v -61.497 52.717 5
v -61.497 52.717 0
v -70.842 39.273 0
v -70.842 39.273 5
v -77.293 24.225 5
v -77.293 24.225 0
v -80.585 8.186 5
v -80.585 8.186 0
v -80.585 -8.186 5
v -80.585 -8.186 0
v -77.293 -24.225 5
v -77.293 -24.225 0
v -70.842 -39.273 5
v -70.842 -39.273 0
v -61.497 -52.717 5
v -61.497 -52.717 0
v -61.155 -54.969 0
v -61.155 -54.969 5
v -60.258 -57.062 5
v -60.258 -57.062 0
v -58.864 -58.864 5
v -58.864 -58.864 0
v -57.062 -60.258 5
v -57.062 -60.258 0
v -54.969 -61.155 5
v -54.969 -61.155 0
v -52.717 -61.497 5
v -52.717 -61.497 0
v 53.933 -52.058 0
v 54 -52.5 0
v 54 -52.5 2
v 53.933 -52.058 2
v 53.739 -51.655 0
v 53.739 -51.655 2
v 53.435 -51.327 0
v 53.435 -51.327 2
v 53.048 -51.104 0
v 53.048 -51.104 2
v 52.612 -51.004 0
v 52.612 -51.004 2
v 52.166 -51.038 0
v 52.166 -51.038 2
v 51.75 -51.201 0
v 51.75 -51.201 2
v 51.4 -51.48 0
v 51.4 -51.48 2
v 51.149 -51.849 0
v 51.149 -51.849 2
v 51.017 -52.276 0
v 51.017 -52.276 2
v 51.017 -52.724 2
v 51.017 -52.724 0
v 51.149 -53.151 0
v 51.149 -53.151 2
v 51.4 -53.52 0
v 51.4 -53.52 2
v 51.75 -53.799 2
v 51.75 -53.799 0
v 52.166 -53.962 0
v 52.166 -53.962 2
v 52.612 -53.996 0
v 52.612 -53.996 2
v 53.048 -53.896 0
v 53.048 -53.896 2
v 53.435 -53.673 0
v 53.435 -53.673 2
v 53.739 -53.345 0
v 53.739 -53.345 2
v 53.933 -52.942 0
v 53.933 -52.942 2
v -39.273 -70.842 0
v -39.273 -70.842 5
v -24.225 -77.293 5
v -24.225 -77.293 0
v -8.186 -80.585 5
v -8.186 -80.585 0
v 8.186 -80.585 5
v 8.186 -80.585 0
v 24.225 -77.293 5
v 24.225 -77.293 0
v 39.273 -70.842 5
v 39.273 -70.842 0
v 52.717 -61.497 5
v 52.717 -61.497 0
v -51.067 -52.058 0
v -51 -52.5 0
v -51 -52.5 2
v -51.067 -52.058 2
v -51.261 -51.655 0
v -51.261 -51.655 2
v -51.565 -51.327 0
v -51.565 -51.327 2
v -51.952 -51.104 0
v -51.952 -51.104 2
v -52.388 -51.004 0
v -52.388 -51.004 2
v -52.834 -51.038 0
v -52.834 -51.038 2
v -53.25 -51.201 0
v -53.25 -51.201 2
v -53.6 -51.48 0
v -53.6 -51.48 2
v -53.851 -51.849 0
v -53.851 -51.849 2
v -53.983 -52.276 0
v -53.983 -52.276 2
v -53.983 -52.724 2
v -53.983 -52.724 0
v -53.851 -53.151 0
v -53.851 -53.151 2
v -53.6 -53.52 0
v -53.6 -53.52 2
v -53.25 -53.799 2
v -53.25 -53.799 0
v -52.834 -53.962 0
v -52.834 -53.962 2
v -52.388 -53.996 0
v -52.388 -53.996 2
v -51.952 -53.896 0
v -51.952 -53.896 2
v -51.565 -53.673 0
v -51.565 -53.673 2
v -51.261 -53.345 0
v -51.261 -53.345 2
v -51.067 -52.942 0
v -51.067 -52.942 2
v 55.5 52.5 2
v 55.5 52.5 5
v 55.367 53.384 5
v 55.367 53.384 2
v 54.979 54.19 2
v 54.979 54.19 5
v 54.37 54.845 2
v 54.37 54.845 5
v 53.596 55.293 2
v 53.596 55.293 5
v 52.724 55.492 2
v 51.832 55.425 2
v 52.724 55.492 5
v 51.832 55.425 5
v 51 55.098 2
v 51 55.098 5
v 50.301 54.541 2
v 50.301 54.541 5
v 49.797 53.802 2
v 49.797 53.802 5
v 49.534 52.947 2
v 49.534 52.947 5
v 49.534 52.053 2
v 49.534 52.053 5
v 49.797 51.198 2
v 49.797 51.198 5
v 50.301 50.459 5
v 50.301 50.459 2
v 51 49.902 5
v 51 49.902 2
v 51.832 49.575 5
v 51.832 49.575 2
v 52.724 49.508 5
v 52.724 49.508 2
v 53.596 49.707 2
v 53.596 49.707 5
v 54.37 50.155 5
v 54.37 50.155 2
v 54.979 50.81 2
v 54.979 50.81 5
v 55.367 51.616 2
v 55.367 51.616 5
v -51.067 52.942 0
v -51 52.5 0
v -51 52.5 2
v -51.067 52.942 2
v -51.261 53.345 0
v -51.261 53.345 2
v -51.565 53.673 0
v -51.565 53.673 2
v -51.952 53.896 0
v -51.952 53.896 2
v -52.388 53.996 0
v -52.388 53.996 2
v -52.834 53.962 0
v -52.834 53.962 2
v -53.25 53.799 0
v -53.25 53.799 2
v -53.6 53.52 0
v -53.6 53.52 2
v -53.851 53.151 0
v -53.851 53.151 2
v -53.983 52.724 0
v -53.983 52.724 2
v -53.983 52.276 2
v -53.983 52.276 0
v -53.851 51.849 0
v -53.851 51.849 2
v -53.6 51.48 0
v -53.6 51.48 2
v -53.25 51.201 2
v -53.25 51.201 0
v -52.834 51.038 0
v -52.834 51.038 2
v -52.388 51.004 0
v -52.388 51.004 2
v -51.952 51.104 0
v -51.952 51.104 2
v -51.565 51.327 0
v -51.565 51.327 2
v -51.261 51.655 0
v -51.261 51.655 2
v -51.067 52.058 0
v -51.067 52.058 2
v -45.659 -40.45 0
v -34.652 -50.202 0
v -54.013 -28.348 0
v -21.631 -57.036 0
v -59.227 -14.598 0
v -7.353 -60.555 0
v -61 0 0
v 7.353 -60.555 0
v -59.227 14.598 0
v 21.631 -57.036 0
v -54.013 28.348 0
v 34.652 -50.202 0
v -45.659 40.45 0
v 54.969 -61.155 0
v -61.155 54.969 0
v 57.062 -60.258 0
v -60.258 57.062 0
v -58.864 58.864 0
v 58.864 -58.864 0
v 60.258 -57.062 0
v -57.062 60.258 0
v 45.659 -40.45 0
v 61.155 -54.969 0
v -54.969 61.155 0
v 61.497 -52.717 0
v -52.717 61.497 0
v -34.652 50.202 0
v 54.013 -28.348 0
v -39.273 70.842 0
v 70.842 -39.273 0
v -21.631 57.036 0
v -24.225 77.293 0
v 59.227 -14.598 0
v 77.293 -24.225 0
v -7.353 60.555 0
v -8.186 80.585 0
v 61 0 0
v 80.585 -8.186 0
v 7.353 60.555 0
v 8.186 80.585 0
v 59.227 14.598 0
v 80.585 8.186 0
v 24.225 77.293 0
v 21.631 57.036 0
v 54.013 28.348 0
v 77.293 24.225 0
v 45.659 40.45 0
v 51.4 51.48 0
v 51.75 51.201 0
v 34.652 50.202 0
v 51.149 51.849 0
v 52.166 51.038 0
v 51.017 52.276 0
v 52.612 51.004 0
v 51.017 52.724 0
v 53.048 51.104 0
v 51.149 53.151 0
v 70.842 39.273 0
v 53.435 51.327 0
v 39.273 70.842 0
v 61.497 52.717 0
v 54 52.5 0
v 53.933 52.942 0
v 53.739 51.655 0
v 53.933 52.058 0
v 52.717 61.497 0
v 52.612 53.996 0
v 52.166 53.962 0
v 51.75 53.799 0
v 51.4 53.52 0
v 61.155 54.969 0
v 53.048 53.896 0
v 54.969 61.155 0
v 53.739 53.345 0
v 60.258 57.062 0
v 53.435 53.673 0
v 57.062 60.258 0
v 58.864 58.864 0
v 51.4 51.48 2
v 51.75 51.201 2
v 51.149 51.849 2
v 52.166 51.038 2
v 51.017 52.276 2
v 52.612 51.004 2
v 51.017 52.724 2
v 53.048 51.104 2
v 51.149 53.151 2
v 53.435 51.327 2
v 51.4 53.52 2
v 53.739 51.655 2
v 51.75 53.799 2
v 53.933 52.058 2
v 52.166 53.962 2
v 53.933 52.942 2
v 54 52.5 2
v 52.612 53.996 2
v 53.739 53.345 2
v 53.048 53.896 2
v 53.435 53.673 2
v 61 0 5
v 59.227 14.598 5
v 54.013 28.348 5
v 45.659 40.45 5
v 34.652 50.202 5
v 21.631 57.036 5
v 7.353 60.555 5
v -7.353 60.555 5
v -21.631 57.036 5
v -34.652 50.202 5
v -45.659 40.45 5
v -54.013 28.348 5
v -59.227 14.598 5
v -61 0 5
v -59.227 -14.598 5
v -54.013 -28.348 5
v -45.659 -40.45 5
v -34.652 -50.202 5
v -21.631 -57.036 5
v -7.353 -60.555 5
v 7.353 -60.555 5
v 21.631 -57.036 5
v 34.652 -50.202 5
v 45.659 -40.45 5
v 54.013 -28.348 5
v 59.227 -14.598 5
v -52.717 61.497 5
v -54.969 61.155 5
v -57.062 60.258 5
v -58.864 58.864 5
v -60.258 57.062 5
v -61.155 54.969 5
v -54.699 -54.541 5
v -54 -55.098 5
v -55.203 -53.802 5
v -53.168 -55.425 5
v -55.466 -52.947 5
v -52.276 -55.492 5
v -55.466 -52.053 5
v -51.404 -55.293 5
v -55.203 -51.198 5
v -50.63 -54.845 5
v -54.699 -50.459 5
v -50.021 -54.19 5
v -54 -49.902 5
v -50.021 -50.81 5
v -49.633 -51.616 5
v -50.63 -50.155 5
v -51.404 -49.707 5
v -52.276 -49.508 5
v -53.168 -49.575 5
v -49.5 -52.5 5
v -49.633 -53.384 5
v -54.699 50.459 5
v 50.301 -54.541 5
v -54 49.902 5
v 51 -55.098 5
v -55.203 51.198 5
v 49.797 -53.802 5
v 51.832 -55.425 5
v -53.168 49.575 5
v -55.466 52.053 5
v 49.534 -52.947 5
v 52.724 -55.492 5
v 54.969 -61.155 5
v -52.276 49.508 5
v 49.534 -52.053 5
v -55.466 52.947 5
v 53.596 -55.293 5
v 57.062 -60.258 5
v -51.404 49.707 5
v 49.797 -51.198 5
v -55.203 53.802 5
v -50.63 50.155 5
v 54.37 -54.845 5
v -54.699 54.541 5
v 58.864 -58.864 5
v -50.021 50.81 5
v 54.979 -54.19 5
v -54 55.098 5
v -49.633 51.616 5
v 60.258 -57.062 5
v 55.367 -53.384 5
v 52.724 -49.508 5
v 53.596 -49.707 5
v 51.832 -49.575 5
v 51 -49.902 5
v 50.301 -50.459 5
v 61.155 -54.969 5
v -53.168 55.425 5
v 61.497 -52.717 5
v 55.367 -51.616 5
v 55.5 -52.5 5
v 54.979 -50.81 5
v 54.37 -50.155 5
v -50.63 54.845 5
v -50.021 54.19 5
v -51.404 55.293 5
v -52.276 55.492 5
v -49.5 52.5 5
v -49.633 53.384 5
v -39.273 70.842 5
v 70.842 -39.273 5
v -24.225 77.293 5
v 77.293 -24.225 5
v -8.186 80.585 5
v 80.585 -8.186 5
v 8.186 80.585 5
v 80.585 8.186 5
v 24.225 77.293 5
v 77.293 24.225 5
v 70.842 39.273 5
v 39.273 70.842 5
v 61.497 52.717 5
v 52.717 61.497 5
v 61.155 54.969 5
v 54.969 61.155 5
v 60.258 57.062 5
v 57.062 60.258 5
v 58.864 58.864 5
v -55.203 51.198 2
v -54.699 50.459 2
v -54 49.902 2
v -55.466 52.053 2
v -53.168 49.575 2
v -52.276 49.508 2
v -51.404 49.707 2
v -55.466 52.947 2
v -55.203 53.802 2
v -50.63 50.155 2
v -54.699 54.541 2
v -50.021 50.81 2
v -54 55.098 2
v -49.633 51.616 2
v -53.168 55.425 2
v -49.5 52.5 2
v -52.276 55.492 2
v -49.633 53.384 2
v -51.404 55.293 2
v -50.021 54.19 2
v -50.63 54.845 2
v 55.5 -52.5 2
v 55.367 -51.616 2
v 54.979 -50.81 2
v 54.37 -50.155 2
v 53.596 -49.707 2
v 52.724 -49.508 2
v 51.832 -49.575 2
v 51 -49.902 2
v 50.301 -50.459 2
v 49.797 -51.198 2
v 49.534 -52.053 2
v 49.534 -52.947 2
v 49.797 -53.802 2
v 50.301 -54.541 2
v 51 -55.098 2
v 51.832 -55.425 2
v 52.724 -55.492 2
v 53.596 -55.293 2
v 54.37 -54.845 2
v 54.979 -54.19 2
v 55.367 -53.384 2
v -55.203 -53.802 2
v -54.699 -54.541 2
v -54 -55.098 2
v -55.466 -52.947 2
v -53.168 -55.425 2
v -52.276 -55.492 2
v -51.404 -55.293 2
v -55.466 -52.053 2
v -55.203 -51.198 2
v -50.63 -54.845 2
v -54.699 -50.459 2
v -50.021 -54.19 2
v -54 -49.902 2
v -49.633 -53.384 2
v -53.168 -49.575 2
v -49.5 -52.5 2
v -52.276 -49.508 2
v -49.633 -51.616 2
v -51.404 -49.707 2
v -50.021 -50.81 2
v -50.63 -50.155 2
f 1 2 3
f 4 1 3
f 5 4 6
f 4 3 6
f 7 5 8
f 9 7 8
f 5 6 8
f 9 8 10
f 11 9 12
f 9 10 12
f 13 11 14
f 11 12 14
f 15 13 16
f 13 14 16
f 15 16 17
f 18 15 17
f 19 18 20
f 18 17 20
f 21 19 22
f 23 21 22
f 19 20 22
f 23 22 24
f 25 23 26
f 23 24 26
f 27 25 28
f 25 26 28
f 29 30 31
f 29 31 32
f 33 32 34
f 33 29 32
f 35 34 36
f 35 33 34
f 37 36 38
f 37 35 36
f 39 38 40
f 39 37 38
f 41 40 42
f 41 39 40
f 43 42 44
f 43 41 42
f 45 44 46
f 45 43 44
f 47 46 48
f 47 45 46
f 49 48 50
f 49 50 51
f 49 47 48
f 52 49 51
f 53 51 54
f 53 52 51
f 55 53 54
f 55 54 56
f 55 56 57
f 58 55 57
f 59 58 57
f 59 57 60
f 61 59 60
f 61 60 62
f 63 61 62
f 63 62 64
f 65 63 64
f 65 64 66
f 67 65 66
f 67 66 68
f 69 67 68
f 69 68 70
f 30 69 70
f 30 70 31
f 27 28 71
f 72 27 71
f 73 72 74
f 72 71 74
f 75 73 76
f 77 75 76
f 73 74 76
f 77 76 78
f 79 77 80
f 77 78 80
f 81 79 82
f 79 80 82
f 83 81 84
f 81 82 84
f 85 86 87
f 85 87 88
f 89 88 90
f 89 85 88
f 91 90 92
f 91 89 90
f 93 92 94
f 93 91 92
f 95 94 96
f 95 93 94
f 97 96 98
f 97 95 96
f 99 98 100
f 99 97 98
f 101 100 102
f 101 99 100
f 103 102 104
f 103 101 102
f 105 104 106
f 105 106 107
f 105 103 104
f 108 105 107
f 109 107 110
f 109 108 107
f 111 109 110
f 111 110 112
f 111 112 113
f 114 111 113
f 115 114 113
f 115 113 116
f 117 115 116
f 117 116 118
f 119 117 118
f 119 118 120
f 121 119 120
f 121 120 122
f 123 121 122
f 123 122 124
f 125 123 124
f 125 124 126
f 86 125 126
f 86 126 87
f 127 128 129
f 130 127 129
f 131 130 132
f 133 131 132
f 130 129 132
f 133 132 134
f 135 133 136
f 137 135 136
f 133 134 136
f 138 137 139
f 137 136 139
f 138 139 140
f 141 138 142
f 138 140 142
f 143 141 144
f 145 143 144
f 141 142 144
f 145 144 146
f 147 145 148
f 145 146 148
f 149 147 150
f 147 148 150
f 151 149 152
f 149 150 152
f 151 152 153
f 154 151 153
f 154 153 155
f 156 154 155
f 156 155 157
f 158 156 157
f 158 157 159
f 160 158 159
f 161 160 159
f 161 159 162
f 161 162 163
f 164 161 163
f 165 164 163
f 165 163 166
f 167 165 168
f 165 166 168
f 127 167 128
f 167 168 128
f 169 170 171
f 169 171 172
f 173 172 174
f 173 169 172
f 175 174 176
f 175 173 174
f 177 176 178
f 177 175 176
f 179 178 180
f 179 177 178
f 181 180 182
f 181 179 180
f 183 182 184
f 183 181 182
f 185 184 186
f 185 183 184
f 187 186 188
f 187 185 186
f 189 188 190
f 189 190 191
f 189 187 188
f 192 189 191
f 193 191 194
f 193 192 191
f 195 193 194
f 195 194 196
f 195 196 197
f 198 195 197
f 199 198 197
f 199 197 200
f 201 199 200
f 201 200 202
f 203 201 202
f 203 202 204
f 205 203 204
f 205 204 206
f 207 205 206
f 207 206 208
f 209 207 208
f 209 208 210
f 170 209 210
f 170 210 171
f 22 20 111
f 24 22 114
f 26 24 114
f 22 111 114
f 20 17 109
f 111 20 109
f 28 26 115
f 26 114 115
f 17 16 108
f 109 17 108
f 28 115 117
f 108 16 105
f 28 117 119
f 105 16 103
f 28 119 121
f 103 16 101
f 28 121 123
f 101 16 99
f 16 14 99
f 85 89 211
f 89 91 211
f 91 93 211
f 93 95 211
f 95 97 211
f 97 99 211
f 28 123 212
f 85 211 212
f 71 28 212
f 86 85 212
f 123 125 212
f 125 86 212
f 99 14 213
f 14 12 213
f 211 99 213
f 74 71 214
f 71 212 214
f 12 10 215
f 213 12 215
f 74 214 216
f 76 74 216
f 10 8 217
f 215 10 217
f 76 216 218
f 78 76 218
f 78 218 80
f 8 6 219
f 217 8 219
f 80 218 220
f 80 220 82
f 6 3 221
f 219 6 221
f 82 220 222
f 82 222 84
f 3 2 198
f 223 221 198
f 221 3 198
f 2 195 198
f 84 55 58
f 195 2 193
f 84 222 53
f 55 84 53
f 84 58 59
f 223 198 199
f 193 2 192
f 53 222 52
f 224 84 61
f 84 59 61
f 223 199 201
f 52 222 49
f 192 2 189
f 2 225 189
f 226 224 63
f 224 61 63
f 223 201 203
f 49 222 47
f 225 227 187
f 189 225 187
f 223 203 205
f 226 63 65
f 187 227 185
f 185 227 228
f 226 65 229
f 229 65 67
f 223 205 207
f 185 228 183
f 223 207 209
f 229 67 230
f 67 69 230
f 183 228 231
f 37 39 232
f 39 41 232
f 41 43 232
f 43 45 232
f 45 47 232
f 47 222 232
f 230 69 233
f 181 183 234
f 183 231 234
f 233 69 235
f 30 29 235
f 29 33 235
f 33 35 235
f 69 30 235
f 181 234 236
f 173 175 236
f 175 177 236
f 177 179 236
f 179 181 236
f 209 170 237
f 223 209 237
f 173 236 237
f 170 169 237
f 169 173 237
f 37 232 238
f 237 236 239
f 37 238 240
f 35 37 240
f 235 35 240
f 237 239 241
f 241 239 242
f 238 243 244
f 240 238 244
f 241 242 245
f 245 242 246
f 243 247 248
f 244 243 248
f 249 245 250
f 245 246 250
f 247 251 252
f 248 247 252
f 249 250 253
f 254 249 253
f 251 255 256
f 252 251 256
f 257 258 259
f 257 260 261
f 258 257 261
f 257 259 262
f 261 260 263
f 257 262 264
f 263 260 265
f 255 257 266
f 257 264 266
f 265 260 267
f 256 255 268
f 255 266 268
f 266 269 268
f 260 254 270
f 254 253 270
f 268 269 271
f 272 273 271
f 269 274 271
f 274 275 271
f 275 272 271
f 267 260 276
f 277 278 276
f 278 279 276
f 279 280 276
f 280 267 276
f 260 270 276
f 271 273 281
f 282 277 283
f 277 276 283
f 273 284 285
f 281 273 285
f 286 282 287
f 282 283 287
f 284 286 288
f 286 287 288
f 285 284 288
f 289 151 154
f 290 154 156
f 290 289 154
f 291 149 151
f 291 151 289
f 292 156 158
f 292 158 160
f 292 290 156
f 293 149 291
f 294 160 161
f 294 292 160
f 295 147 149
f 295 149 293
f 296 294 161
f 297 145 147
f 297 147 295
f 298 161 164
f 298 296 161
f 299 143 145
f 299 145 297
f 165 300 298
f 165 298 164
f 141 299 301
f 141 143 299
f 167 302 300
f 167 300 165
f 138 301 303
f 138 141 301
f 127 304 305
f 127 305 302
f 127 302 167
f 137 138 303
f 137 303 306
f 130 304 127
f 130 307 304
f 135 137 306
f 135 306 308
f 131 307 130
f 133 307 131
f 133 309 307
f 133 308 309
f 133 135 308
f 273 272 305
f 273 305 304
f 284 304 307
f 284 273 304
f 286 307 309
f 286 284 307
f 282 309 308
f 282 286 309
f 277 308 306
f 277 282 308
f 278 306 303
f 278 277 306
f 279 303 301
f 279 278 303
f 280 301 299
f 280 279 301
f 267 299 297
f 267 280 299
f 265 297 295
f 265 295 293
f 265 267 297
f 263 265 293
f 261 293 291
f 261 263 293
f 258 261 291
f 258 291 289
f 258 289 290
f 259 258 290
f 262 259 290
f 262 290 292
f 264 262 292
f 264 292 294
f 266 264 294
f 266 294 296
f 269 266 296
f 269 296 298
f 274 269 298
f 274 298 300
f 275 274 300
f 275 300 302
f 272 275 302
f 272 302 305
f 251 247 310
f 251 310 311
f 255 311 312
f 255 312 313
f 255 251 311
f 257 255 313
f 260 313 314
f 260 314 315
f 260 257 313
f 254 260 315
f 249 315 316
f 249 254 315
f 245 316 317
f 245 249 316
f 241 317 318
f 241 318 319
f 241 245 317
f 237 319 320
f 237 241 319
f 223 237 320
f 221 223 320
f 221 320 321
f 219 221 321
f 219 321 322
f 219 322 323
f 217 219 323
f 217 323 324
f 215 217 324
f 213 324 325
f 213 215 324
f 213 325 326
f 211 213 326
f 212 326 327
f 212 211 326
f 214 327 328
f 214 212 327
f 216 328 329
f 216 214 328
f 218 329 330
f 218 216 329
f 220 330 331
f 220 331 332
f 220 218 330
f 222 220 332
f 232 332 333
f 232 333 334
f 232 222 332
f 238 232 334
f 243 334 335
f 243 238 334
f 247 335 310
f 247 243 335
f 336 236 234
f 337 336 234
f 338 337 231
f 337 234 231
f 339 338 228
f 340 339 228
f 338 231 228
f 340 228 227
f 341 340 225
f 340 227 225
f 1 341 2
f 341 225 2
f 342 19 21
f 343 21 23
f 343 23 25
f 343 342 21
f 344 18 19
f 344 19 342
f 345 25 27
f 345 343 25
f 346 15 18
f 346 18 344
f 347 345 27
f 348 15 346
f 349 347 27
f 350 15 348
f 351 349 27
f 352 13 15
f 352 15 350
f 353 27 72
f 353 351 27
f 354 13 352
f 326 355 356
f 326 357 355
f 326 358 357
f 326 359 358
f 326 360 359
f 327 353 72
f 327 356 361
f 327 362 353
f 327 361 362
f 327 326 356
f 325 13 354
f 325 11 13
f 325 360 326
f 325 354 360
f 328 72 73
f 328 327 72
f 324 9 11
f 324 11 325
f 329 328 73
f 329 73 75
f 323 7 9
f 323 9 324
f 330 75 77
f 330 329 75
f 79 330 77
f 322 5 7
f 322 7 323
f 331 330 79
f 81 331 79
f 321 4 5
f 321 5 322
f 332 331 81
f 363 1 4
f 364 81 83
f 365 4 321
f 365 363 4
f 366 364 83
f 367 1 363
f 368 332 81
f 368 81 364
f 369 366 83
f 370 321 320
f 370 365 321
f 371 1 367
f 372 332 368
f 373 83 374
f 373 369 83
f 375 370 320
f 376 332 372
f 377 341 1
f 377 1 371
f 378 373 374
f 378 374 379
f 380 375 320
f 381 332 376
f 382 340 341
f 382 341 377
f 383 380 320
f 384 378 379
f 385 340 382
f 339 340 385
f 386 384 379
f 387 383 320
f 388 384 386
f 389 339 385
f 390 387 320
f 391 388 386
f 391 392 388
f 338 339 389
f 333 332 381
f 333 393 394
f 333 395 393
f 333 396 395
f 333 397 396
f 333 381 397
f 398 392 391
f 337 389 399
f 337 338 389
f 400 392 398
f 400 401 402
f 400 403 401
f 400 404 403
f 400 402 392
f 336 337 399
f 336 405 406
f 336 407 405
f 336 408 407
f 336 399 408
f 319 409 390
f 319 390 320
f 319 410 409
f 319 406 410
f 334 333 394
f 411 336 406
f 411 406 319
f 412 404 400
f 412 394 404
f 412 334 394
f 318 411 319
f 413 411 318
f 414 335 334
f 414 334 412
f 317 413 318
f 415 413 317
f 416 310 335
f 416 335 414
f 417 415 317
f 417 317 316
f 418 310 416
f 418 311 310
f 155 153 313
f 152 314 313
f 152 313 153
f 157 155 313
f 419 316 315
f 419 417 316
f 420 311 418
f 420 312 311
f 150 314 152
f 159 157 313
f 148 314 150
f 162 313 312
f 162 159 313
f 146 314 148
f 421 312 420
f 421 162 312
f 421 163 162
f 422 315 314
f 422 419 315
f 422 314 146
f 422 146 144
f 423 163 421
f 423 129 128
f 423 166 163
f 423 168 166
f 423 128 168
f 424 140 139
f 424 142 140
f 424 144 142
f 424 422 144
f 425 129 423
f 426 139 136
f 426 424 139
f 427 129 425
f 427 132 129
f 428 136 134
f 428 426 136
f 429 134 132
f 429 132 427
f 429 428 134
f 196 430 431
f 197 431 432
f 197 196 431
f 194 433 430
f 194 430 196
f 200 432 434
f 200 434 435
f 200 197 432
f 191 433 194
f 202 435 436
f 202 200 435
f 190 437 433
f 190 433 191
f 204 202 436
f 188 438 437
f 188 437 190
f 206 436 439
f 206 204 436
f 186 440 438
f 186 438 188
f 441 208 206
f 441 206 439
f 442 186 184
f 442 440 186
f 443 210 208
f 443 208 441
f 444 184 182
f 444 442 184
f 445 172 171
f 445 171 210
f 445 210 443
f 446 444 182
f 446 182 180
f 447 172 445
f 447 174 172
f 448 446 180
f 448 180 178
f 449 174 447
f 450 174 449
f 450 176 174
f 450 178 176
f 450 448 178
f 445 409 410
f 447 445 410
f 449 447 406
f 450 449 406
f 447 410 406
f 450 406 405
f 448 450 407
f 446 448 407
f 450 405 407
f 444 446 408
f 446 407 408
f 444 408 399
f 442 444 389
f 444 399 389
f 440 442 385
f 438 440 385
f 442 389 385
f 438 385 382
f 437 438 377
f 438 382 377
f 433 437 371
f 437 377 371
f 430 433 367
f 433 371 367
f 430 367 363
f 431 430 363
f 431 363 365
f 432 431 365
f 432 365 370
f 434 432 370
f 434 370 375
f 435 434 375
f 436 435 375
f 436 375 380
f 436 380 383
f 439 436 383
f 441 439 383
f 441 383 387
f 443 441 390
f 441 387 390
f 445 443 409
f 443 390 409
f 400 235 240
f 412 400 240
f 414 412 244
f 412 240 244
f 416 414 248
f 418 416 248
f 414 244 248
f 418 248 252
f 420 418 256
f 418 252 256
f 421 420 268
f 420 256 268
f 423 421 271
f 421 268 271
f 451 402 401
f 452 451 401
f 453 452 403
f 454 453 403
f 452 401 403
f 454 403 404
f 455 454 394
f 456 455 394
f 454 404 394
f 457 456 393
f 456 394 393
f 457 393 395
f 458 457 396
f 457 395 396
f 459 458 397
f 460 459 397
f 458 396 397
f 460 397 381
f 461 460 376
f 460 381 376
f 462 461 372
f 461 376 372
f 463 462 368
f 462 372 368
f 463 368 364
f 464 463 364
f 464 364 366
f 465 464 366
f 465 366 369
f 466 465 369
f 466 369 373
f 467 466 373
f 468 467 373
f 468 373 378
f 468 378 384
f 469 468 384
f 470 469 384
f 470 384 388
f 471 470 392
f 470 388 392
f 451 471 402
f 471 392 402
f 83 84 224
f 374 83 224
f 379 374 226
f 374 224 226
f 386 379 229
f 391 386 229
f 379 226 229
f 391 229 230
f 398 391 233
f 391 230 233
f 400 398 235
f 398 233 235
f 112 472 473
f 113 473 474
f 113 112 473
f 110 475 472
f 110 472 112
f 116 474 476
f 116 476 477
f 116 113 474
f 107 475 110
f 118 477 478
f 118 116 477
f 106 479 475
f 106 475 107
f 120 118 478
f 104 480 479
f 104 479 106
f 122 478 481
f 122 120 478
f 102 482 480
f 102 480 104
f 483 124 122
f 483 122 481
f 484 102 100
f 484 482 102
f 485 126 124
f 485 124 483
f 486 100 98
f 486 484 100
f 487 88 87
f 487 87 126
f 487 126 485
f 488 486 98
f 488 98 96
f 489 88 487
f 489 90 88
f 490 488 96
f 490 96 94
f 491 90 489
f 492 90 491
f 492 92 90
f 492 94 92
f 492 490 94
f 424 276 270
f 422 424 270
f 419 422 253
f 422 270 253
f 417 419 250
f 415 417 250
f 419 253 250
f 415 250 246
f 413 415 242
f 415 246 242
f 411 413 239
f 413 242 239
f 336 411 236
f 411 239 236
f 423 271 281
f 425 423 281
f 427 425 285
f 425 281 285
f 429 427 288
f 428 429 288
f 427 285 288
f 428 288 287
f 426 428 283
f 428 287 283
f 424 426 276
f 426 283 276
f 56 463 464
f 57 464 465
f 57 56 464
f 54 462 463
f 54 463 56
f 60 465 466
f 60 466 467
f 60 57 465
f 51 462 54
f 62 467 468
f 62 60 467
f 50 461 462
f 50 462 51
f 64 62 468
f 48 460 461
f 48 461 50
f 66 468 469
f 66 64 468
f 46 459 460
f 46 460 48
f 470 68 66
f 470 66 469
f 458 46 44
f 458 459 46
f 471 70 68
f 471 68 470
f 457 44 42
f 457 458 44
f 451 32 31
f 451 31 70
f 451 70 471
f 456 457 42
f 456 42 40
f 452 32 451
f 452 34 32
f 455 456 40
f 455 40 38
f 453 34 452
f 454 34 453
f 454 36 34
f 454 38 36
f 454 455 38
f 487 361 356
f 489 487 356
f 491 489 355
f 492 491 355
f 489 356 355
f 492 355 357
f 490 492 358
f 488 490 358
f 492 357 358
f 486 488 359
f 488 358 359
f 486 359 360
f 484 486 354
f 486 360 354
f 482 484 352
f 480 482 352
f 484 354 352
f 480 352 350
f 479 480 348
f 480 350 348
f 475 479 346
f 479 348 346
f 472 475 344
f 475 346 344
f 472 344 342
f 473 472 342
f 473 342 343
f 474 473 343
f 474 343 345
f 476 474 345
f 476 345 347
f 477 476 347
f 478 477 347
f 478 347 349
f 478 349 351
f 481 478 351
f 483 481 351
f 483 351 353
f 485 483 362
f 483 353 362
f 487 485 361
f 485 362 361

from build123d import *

# Parameters (mm, degrees)
F2_R     = 1.5
F2_R_2   = 61
F3_DEPTH = 5
F4_R     = 3
F4_R_2   = 1.5
F5_DEPTH = 3


with BuildPart() as f3:
    # F2 (on Top) → F3 (new body)
    with BuildSketch(Plane.XY):
        with BuildLine():
            ThreePointArc((-52.7168997325, 61.4973859818), (-58.8639610307, 58.8639610307), (-61.4973859818, 52.7168997325))
            ThreePointArc((-61.4973859818, 52.7168997325), (-81, 0), (-61.4973859818, -52.7168997325))
            ThreePointArc((-61.4973859818, -52.7168997325), (-58.8639610307, -58.8639610307), (-52.7168997325, -61.4973859818))
            ThreePointArc((-52.7168997325, -61.4973859818), (0, -81), (52.7168997325, -61.4973859818))
            ThreePointArc((52.7168997325, -61.4973859818), (58.8639610307, -58.8639610307), (61.4973859818, -52.7168997325))
            ThreePointArc((61.4973859818, -52.7168997325), (81, 0), (61.4973859818, 52.7168997325))
            ThreePointArc((61.4973859818, 52.7168997325), (58.8639610307, 58.8639610307), (52.7168997325, 61.4973859818))
            ThreePointArc((52.7168997325, 61.4973859818), (0, 81), (-52.7168997325, 61.4973859818))
        make_face()
        with Locations((-52.5, -52.5)):
            Circle(F2_R, mode=Mode.SUBTRACT)
        with Locations((52.5, -52.5)):
            Circle(F2_R, mode=Mode.SUBTRACT)
        Circle(F2_R_2, mode=Mode.SUBTRACT)
        with Locations((-52.5, 52.5)):
            Circle(F2_R, mode=Mode.SUBTRACT)
        with Locations((52.5, 52.5)):
            Circle(F2_R, mode=Mode.SUBTRACT)
    extrude(amount=F3_DEPTH)

    # F4 (on face) → F5 (cut)
    with BuildSketch(Plane.XY.offset(5)):
        with Locations((-52.5, 52.5)):
            Circle(F4_R)
        with Locations((-52.5, 52.5)):
            Circle(F4_R_2, mode=Mode.SUBTRACT)
        with Locations((52.5, 52.5)):
            Circle(F4_R)
        with Locations((52.5, 52.5)):
            Circle(F4_R_2, mode=Mode.SUBTRACT)
        with Locations((-52.5, -52.5)):
            Circle(F4_R)
        with Locations((-52.5, -52.5)):
            Circle(F4_R_2, mode=Mode.SUBTRACT)
        with Locations((52.5, -52.5)):
            Circle(F4_R)
        with Locations((52.5, -52.5)):
            Circle(F4_R_2, mode=Mode.SUBTRACT)
    extrude(amount=-F5_DEPTH, mode=Mode.SUBTRACT)


solid = f3.part
